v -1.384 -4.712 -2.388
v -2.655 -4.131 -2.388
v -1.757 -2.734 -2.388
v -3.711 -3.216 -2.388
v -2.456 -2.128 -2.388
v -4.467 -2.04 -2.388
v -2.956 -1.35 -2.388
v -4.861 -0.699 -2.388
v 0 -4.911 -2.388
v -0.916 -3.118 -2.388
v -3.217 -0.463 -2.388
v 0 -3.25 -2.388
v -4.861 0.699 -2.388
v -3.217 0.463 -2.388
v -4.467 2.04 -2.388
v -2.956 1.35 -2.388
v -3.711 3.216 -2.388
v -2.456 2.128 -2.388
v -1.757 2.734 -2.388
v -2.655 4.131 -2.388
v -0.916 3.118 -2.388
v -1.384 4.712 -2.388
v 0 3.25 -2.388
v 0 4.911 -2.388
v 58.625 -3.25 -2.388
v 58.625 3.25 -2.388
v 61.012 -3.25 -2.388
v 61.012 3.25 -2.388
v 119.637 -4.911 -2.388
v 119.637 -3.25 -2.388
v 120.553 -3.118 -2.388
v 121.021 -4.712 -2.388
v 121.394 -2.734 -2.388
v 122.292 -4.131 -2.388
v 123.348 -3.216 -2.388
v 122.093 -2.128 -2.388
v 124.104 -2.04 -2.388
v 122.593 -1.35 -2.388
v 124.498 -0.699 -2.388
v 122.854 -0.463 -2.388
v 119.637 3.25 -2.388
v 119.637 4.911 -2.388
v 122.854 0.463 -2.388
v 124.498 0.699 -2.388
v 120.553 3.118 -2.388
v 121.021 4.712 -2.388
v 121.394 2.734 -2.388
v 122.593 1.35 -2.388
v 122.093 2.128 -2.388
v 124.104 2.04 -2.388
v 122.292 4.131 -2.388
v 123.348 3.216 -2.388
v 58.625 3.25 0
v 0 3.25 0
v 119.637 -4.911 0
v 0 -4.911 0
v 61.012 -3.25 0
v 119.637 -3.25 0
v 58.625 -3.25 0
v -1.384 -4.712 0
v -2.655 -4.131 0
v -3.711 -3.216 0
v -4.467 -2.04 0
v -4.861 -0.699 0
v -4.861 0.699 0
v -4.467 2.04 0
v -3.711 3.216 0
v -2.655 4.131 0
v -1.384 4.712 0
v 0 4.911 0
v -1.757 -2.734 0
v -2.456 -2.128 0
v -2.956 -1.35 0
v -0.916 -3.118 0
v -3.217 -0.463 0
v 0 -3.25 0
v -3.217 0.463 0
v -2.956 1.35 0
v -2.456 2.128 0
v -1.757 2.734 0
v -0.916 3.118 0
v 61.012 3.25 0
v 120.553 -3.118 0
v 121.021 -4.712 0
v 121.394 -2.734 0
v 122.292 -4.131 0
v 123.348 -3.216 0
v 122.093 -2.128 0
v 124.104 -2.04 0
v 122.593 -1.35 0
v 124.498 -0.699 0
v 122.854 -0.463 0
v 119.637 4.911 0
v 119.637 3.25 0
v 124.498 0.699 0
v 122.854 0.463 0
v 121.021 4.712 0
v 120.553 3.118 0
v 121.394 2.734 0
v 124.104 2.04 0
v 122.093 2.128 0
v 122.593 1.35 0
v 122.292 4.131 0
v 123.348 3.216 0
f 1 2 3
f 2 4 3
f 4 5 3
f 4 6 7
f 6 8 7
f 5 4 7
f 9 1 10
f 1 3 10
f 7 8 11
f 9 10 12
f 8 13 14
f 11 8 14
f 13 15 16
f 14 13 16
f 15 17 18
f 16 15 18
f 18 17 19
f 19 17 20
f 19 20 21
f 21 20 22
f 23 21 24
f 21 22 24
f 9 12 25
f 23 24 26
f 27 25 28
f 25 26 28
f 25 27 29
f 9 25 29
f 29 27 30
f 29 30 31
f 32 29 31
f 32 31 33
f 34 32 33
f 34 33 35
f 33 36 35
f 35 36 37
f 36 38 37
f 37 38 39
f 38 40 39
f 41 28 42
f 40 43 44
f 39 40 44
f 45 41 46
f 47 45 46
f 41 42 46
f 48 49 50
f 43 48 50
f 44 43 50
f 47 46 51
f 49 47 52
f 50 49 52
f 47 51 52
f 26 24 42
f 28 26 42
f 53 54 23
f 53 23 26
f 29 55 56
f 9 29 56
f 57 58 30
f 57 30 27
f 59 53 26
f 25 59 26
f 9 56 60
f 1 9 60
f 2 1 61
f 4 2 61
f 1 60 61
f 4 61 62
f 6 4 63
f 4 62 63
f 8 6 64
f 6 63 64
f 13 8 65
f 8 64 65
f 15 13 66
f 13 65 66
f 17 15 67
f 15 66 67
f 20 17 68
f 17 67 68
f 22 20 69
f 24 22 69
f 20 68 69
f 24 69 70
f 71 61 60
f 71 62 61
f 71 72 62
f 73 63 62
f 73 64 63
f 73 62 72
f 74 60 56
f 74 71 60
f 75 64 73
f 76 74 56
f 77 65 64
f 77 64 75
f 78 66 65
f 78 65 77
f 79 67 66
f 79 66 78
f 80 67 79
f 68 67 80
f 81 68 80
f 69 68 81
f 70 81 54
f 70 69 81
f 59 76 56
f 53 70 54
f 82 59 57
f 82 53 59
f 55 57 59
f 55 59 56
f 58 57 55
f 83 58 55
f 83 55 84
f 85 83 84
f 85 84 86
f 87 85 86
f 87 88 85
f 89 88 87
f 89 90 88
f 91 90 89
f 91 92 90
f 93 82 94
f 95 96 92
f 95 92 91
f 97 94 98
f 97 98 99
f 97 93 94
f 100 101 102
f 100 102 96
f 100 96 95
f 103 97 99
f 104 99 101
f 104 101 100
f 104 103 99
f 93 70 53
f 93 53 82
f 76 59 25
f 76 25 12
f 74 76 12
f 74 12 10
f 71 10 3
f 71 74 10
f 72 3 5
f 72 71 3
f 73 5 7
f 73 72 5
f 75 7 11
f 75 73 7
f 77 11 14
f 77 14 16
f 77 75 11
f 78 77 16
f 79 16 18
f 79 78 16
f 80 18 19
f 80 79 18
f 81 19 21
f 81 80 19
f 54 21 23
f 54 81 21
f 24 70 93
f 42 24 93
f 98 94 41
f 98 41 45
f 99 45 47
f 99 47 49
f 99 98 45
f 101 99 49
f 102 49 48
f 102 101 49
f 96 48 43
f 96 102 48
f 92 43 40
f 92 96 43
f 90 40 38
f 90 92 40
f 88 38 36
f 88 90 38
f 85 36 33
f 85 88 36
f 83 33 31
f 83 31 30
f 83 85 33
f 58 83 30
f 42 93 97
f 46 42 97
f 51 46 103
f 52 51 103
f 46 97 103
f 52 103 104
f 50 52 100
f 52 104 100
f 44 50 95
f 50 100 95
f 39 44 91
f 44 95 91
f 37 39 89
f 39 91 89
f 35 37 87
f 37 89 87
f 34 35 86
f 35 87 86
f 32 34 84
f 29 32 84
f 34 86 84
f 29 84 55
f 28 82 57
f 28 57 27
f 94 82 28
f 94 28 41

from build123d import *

# Parameters (mm, degrees)
BOSS_EXTRUDE1_DEPTH             = 2.3876
BOSS_EXTRUDE2_REACH             = 126.668
SKETCH2_W                       = 2.3876
SKETCH2_H                       = 2.3876
BOSS_EXTRUDE2_DIRECTION_2_REACH = 126.668


with BuildPart() as part:
    # Sketch1 → Boss-Extrude1 (new body)
    with BuildSketch(Plane.XY):
        with BuildLine():
            Line((0, 4.91087), (119.637, 4.91087))
            ThreePointArc((119.637, 4.91087), (124.54787, 0), (119.637, -4.91087))
            Line((119.637, -4.91087), (0, -4.91087))
            ThreePointArc((0, -4.91087), (-4.91087, 0), (0, 4.91087))
        make_face()
        with BuildLine():
            Line((0, 3.25), (119.637, 3.25))
            ThreePointArc((119.637, 3.25), (122.887, 0), (119.637, -3.25))
            Line((119.637, -3.25), (0, -3.25))
            ThreePointArc((0, -3.25), (-3.25, 0), (0, 3.25))
        make_face(mode=Mode.SUBTRACT)
    extrude(amount=-BOSS_EXTRUDE1_DEPTH)

    # Sketch2 → Boss-Extrude2 (add, up to next)
    with BuildSketch(Plane(origin=(0, 0, 0), x_dir=(1, 0, 0), z_dir=(0, 1, 0)), mode=Mode.PRIVATE) as boss_extrude2_sk1:
        with Locations((59.8185, 1.1938)):
            Rectangle(SKETCH2_W, SKETCH2_H)
    boss_extrude2_tool1 = extrude(boss_extrude2_sk1.sketch, amount=BOSS_EXTRUDE2_REACH, mode=Mode.PRIVATE) - part.part
    add(boss_extrude2_tool1.solids().sort_by_distance((59.8185, 0, -1.1938))[0])

    # Sketch2 → Boss-Extrude2 direction 2 (add, up to next)
    with BuildSketch(Plane(origin=(0, 0, 0), x_dir=(1, 0, 0), z_dir=(0, 1, 0)), mode=Mode.PRIVATE) as boss_extrude2_direction_2_sk1:
        with Locations((59.8185, 1.1938)):
            Rectangle(SKETCH2_W, SKETCH2_H)
    boss_extrude2_direction_2_tool1 = extrude(boss_extrude2_direction_2_sk1.sketch, amount=-BOSS_EXTRUDE2_DIRECTION_2_REACH, mode=Mode.PRIVATE) - part.part
    add(boss_extrude2_direction_2_tool1.solids().sort_by_distance((59.8185, 0, -1.1938))[0])


solid = part.part
